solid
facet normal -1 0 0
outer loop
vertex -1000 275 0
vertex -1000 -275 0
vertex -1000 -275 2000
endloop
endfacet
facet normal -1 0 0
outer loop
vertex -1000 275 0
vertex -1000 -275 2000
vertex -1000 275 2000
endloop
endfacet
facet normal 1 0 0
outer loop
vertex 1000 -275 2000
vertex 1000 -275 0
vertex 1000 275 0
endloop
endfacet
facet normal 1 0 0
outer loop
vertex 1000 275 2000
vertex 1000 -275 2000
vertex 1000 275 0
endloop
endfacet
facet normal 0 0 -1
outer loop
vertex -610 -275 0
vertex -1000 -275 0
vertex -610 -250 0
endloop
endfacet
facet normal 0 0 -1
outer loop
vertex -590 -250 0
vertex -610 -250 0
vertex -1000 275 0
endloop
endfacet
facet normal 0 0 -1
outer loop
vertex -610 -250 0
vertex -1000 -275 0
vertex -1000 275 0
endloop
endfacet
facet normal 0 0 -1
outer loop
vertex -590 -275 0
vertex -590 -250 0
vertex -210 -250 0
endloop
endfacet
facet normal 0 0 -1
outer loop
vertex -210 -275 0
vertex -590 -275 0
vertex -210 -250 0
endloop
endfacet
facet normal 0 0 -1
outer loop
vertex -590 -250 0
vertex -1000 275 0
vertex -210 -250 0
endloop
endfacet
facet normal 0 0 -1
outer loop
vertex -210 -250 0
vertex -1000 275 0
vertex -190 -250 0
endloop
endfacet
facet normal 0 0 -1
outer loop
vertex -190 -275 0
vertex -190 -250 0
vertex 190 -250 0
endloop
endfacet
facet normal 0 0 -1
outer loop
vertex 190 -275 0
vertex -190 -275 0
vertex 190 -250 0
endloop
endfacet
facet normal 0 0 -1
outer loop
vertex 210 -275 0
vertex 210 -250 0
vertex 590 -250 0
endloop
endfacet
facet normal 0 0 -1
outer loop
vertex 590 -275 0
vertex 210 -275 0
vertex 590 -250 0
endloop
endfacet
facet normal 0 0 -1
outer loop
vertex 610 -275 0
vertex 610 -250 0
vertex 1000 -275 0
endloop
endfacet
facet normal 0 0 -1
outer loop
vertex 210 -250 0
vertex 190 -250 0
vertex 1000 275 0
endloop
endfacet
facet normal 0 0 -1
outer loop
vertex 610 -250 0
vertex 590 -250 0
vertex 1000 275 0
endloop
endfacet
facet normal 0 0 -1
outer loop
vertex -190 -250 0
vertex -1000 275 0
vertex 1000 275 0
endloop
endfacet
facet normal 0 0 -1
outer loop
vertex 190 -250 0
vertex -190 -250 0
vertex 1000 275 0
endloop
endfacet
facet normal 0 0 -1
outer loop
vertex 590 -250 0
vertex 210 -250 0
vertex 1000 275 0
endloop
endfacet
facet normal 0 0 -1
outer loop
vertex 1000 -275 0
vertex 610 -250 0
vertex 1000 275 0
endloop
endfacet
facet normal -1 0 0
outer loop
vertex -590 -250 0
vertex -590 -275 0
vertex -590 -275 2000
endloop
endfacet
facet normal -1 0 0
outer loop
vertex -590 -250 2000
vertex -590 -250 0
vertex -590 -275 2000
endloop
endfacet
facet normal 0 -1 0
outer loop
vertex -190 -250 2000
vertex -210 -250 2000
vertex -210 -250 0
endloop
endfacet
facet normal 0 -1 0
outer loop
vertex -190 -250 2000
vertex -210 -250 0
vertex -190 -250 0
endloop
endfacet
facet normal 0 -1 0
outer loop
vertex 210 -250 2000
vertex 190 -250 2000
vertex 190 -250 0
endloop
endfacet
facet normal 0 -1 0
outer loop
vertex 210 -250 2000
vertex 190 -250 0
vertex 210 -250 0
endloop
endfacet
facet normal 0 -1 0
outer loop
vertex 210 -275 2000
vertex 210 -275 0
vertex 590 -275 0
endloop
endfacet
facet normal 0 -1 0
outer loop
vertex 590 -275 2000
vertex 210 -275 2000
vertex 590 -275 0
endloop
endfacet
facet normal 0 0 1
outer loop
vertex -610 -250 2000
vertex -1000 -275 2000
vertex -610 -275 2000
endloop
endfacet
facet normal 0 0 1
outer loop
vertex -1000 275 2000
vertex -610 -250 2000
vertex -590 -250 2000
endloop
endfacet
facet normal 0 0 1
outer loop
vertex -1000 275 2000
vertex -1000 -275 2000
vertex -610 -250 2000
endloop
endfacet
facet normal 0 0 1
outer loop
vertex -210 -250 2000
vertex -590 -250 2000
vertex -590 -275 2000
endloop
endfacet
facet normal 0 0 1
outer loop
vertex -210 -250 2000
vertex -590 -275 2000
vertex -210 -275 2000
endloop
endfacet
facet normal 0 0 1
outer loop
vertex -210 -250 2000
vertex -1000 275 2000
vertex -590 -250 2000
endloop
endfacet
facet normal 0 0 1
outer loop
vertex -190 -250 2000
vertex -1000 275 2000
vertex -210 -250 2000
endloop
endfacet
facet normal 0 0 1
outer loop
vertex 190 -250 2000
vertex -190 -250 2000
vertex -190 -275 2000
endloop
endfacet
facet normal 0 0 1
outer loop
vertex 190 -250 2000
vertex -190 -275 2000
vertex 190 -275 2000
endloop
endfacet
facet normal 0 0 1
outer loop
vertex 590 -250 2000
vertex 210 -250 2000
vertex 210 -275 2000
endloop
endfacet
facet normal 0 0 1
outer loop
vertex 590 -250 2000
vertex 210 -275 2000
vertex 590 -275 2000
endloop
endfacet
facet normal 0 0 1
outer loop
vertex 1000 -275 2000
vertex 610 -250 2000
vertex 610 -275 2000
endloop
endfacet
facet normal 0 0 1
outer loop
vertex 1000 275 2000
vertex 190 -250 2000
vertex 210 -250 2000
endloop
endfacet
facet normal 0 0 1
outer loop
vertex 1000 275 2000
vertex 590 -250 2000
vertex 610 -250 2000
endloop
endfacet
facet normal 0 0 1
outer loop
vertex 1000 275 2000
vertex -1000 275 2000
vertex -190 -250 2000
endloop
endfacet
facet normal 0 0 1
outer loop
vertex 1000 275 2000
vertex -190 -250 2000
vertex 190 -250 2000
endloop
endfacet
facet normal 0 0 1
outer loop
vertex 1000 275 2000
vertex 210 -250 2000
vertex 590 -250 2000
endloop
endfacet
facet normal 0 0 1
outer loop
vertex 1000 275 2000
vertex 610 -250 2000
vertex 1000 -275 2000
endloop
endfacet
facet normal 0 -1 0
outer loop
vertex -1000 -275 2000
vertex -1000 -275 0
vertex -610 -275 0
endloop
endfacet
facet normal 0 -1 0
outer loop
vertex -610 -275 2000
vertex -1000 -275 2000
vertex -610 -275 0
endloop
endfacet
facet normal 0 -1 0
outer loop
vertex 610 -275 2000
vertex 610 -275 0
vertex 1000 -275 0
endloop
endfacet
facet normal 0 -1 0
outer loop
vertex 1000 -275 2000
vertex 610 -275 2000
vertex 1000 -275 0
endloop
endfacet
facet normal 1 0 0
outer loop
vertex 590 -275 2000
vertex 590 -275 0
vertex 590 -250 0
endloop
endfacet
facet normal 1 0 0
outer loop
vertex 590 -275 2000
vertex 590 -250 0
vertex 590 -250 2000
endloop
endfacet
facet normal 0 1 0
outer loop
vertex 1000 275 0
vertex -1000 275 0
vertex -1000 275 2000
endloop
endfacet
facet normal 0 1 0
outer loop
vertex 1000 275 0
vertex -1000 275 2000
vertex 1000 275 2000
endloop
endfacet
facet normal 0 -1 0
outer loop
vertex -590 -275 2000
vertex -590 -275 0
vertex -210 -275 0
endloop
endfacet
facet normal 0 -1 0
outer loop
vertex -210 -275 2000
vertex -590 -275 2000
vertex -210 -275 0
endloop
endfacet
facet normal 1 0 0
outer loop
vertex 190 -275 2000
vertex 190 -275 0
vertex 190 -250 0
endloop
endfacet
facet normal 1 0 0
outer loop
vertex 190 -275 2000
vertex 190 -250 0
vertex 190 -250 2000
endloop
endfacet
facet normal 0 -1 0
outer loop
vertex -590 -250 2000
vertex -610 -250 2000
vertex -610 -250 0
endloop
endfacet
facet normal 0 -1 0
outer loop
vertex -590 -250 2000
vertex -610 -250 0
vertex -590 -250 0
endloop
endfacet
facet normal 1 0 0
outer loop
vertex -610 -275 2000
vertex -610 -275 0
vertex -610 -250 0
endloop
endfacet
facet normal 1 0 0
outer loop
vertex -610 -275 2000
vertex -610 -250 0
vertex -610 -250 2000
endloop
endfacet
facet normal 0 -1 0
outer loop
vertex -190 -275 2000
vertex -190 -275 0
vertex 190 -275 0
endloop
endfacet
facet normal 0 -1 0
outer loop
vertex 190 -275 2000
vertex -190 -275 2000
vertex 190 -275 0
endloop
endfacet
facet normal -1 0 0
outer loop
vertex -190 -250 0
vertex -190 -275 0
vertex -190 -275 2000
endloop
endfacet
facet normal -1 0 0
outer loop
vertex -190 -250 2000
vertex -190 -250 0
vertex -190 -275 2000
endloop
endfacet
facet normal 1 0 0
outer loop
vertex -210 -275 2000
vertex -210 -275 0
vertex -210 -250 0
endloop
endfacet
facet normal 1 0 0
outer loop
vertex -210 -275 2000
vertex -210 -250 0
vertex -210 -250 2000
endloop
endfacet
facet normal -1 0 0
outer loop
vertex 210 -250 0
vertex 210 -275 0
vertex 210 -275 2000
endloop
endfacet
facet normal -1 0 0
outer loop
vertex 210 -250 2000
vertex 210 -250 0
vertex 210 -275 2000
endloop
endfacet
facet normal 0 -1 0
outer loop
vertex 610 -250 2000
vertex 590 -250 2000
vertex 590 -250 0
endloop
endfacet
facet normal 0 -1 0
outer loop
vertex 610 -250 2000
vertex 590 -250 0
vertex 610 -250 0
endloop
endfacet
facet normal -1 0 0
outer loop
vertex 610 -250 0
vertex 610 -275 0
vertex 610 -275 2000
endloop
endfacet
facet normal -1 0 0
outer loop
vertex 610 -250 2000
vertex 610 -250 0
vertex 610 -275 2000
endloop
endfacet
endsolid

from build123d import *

# Parameters (mm, degrees)
F0_W     = 2000
F0_H     = 550
F1_DEPTH = 2000
F2_W     = 20
F2_H     = 2000
F3_DEPTH = 25


with BuildPart() as f1:
    # F0 (on Top) → F1 (new body)
    with BuildSketch(Plane.XY):
        Rectangle(F0_W, F0_H)
    extrude(amount=F1_DEPTH)

    # F2 (on face) → F3 (cut)
    with BuildSketch(Plane.XZ.offset(275)):
        with Locations((-600, 1000)):
            Rectangle(F2_W, F2_H)
        with Locations((-200, 1000)):
            Rectangle(F2_W, F2_H)
        with Locations((200, 1000)):
            Rectangle(F2_W, F2_H)
        with Locations((600, 1000)):
            Rectangle(F2_W, F2_H)
    extrude(amount=-F3_DEPTH, mode=Mode.SUBTRACT)


solid = f1.part
